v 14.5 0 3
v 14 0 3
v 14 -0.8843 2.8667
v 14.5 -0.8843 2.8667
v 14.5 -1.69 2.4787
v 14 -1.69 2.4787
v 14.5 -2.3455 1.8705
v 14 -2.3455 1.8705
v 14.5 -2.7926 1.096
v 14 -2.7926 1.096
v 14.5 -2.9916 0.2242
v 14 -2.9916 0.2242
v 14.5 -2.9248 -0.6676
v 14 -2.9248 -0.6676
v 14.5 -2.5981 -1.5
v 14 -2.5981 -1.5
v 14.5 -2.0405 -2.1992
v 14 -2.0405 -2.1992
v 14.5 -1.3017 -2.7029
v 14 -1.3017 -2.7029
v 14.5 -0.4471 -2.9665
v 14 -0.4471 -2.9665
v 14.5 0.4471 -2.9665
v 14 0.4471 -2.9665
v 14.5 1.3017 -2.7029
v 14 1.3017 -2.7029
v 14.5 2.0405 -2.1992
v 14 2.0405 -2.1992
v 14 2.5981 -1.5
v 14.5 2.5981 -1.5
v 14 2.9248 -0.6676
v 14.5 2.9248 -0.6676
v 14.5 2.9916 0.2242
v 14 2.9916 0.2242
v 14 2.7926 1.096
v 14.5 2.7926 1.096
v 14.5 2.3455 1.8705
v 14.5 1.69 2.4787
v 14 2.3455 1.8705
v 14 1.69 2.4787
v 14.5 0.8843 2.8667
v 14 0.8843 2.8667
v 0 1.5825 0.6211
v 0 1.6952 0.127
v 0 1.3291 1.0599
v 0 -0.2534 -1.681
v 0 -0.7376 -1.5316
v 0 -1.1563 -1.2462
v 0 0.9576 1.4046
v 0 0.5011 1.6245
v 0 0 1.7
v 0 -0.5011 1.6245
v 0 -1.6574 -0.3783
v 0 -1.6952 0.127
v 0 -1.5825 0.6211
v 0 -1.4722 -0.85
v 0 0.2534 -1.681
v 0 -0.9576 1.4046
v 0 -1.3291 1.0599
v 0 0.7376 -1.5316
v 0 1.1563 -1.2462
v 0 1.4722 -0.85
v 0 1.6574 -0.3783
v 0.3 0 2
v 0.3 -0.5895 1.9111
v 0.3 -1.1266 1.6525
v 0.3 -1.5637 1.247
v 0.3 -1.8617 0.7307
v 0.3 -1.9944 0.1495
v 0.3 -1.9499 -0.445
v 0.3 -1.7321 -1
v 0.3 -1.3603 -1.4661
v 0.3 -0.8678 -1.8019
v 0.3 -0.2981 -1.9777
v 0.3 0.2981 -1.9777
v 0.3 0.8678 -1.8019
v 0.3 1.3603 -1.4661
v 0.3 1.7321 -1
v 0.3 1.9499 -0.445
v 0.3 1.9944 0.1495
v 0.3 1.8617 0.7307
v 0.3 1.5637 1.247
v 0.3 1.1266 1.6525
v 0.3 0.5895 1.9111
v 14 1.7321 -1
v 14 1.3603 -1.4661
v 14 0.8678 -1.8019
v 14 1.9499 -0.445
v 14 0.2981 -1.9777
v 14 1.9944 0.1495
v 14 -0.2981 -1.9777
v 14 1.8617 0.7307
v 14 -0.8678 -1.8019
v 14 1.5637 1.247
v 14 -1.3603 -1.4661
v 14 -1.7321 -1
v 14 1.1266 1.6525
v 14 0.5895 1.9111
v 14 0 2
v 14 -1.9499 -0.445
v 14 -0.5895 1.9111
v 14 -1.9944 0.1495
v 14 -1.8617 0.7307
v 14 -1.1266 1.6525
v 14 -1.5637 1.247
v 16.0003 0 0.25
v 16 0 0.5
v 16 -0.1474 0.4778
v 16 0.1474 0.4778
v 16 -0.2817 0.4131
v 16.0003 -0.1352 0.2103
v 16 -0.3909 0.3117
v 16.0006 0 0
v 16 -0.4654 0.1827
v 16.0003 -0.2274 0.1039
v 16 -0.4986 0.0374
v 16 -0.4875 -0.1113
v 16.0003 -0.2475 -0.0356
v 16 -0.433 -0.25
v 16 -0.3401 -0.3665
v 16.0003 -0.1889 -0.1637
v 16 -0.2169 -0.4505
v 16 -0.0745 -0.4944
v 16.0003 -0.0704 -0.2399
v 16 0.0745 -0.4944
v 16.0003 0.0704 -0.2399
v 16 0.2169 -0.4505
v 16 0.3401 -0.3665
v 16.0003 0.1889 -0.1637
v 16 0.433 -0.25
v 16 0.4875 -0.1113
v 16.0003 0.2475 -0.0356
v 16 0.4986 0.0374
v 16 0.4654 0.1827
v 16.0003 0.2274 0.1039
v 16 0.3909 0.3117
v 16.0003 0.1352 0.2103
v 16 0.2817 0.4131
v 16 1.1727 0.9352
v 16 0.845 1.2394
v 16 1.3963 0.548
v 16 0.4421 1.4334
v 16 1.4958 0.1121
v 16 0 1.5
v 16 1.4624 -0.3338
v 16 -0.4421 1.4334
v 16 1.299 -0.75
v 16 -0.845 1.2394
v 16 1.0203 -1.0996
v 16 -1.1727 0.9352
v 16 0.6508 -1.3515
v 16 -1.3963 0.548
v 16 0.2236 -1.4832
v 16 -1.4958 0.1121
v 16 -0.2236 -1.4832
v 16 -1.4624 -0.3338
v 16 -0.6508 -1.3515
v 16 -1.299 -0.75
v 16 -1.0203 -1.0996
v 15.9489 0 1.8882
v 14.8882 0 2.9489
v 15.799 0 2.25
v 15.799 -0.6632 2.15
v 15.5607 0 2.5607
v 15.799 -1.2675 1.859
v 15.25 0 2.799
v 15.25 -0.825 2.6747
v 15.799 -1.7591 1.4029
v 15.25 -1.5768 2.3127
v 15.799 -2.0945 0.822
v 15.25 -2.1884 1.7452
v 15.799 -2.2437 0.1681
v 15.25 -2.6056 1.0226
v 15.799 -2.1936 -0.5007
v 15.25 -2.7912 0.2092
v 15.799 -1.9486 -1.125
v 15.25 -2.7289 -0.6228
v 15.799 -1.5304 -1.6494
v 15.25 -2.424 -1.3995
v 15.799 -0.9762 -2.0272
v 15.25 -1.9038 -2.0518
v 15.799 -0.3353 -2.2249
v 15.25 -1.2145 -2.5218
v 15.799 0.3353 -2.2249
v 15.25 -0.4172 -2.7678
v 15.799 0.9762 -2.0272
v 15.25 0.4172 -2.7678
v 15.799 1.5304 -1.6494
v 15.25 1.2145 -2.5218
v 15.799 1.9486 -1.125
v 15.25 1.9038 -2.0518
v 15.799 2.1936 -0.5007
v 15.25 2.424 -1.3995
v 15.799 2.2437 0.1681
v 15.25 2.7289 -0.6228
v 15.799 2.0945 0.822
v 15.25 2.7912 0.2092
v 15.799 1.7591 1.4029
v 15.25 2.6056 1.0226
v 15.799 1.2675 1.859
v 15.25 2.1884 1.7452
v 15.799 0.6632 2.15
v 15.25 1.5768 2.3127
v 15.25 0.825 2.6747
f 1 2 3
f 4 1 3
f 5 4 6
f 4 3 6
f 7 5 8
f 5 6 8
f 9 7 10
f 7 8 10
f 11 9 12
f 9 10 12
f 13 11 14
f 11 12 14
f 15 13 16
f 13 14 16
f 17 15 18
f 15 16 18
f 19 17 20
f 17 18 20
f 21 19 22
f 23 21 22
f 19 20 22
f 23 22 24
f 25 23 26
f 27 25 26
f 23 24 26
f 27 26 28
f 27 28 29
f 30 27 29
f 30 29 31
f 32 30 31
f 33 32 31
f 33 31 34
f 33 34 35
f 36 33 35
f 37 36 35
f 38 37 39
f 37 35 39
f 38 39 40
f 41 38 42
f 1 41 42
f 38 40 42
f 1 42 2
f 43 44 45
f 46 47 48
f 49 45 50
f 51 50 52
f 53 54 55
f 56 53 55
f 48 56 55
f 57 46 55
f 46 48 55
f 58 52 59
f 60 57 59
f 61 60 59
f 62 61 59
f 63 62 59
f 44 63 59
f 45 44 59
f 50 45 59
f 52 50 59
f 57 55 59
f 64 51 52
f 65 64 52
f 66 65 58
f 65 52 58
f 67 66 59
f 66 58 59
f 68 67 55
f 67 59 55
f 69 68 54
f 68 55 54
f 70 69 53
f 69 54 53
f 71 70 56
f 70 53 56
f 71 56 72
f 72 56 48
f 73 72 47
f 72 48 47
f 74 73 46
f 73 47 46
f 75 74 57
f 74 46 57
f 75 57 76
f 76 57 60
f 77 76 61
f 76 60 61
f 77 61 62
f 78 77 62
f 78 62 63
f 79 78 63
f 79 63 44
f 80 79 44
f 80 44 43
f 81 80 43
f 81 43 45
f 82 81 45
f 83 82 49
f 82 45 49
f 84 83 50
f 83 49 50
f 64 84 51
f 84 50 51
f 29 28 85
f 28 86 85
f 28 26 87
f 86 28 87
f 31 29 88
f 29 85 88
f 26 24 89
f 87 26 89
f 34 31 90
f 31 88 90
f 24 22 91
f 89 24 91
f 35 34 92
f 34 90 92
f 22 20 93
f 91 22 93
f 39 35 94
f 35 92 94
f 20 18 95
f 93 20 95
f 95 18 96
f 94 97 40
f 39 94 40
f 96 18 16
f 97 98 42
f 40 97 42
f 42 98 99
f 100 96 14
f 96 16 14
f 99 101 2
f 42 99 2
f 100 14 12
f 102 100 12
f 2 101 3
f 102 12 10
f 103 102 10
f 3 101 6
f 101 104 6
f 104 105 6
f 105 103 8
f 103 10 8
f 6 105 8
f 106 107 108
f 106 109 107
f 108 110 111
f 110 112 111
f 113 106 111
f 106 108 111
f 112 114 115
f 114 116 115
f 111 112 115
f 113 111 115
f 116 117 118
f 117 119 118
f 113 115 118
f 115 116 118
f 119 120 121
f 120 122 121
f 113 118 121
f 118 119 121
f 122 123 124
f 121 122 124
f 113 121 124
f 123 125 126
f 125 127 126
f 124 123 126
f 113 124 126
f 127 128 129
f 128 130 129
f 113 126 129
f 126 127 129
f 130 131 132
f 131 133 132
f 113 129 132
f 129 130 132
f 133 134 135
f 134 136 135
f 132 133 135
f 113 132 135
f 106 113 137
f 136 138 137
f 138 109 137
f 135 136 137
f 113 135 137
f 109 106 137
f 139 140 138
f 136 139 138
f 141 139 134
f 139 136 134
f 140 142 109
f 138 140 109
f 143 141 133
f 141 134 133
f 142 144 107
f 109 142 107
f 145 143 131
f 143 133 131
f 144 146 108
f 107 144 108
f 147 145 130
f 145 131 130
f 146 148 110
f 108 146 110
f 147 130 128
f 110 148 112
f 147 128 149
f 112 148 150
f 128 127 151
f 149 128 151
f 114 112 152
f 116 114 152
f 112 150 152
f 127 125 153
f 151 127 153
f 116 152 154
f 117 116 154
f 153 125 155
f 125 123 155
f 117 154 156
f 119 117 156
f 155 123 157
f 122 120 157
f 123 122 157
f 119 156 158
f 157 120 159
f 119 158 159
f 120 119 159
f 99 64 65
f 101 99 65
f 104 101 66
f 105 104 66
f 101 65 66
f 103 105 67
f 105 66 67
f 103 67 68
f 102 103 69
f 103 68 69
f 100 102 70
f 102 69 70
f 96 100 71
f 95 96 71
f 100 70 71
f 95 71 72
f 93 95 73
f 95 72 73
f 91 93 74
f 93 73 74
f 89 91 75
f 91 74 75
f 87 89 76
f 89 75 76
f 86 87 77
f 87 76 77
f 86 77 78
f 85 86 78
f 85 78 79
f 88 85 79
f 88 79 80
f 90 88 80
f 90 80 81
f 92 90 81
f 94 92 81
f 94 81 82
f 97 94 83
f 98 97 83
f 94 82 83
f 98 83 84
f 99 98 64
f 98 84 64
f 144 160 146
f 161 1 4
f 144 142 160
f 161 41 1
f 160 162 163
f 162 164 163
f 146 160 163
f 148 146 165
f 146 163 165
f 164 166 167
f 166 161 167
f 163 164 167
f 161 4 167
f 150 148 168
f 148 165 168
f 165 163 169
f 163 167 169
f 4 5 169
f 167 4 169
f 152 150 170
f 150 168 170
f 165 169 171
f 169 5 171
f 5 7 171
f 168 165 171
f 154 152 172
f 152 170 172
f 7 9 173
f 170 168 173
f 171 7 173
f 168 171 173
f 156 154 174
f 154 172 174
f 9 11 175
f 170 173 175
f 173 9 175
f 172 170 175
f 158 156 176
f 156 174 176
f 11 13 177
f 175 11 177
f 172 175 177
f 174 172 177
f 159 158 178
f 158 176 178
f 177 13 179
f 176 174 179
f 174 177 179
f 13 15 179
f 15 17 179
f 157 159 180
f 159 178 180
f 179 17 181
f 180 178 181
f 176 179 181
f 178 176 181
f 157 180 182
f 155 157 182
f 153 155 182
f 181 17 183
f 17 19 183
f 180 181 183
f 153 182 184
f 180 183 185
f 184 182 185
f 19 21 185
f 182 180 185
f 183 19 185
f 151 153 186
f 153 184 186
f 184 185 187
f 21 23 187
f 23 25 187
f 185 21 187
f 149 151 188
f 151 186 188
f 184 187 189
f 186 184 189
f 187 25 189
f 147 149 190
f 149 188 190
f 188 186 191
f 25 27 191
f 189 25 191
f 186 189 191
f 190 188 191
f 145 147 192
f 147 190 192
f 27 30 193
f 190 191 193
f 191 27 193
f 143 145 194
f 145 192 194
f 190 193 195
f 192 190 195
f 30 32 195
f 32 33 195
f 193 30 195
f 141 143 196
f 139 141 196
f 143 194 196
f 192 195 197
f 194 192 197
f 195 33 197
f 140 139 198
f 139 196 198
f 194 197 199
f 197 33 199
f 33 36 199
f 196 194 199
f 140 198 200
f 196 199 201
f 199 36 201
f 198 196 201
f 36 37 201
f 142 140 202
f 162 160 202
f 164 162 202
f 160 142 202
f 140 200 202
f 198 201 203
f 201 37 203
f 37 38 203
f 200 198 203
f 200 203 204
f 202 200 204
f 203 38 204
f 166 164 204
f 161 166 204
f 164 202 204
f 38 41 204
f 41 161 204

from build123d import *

# Parameters (mm, degrees)
FILETE1_R     = 1.5
CHANFRO1_SIZE = 0.3


with BuildPart() as part:
    # Esboço1 → Revolução1 (revolve)
    with BuildSketch(Plane.XY, mode=Mode.PRIVATE) as revolu_o1_sk:
        Polygon((0, 0), (16.000553077, 0), (16, 0.5), (16, 3), (14, 3), (14, 2), (0, 2), align=None)
    revolve(revolu_o1_sk.sketch.rotate(Axis((0, 0, 0), (1, 0, 0)), 90), axis=Axis((0, 0, 0), (1, 0, 0)))

    # Filete1
    filete1_edges = [part.edges().sort_by_distance(p)[0] for p in [
        (16, 0, -3),
    ]]
    fillet(filete1_edges, radius=FILETE1_R)

    # Chanfro1
    chanfro1_edges = [part.edges().sort_by_distance(p)[0] for p in [
        (0, 0, -2),
    ]]
    chamfer(chanfro1_edges, length=CHANFRO1_SIZE)


solid = part.part
